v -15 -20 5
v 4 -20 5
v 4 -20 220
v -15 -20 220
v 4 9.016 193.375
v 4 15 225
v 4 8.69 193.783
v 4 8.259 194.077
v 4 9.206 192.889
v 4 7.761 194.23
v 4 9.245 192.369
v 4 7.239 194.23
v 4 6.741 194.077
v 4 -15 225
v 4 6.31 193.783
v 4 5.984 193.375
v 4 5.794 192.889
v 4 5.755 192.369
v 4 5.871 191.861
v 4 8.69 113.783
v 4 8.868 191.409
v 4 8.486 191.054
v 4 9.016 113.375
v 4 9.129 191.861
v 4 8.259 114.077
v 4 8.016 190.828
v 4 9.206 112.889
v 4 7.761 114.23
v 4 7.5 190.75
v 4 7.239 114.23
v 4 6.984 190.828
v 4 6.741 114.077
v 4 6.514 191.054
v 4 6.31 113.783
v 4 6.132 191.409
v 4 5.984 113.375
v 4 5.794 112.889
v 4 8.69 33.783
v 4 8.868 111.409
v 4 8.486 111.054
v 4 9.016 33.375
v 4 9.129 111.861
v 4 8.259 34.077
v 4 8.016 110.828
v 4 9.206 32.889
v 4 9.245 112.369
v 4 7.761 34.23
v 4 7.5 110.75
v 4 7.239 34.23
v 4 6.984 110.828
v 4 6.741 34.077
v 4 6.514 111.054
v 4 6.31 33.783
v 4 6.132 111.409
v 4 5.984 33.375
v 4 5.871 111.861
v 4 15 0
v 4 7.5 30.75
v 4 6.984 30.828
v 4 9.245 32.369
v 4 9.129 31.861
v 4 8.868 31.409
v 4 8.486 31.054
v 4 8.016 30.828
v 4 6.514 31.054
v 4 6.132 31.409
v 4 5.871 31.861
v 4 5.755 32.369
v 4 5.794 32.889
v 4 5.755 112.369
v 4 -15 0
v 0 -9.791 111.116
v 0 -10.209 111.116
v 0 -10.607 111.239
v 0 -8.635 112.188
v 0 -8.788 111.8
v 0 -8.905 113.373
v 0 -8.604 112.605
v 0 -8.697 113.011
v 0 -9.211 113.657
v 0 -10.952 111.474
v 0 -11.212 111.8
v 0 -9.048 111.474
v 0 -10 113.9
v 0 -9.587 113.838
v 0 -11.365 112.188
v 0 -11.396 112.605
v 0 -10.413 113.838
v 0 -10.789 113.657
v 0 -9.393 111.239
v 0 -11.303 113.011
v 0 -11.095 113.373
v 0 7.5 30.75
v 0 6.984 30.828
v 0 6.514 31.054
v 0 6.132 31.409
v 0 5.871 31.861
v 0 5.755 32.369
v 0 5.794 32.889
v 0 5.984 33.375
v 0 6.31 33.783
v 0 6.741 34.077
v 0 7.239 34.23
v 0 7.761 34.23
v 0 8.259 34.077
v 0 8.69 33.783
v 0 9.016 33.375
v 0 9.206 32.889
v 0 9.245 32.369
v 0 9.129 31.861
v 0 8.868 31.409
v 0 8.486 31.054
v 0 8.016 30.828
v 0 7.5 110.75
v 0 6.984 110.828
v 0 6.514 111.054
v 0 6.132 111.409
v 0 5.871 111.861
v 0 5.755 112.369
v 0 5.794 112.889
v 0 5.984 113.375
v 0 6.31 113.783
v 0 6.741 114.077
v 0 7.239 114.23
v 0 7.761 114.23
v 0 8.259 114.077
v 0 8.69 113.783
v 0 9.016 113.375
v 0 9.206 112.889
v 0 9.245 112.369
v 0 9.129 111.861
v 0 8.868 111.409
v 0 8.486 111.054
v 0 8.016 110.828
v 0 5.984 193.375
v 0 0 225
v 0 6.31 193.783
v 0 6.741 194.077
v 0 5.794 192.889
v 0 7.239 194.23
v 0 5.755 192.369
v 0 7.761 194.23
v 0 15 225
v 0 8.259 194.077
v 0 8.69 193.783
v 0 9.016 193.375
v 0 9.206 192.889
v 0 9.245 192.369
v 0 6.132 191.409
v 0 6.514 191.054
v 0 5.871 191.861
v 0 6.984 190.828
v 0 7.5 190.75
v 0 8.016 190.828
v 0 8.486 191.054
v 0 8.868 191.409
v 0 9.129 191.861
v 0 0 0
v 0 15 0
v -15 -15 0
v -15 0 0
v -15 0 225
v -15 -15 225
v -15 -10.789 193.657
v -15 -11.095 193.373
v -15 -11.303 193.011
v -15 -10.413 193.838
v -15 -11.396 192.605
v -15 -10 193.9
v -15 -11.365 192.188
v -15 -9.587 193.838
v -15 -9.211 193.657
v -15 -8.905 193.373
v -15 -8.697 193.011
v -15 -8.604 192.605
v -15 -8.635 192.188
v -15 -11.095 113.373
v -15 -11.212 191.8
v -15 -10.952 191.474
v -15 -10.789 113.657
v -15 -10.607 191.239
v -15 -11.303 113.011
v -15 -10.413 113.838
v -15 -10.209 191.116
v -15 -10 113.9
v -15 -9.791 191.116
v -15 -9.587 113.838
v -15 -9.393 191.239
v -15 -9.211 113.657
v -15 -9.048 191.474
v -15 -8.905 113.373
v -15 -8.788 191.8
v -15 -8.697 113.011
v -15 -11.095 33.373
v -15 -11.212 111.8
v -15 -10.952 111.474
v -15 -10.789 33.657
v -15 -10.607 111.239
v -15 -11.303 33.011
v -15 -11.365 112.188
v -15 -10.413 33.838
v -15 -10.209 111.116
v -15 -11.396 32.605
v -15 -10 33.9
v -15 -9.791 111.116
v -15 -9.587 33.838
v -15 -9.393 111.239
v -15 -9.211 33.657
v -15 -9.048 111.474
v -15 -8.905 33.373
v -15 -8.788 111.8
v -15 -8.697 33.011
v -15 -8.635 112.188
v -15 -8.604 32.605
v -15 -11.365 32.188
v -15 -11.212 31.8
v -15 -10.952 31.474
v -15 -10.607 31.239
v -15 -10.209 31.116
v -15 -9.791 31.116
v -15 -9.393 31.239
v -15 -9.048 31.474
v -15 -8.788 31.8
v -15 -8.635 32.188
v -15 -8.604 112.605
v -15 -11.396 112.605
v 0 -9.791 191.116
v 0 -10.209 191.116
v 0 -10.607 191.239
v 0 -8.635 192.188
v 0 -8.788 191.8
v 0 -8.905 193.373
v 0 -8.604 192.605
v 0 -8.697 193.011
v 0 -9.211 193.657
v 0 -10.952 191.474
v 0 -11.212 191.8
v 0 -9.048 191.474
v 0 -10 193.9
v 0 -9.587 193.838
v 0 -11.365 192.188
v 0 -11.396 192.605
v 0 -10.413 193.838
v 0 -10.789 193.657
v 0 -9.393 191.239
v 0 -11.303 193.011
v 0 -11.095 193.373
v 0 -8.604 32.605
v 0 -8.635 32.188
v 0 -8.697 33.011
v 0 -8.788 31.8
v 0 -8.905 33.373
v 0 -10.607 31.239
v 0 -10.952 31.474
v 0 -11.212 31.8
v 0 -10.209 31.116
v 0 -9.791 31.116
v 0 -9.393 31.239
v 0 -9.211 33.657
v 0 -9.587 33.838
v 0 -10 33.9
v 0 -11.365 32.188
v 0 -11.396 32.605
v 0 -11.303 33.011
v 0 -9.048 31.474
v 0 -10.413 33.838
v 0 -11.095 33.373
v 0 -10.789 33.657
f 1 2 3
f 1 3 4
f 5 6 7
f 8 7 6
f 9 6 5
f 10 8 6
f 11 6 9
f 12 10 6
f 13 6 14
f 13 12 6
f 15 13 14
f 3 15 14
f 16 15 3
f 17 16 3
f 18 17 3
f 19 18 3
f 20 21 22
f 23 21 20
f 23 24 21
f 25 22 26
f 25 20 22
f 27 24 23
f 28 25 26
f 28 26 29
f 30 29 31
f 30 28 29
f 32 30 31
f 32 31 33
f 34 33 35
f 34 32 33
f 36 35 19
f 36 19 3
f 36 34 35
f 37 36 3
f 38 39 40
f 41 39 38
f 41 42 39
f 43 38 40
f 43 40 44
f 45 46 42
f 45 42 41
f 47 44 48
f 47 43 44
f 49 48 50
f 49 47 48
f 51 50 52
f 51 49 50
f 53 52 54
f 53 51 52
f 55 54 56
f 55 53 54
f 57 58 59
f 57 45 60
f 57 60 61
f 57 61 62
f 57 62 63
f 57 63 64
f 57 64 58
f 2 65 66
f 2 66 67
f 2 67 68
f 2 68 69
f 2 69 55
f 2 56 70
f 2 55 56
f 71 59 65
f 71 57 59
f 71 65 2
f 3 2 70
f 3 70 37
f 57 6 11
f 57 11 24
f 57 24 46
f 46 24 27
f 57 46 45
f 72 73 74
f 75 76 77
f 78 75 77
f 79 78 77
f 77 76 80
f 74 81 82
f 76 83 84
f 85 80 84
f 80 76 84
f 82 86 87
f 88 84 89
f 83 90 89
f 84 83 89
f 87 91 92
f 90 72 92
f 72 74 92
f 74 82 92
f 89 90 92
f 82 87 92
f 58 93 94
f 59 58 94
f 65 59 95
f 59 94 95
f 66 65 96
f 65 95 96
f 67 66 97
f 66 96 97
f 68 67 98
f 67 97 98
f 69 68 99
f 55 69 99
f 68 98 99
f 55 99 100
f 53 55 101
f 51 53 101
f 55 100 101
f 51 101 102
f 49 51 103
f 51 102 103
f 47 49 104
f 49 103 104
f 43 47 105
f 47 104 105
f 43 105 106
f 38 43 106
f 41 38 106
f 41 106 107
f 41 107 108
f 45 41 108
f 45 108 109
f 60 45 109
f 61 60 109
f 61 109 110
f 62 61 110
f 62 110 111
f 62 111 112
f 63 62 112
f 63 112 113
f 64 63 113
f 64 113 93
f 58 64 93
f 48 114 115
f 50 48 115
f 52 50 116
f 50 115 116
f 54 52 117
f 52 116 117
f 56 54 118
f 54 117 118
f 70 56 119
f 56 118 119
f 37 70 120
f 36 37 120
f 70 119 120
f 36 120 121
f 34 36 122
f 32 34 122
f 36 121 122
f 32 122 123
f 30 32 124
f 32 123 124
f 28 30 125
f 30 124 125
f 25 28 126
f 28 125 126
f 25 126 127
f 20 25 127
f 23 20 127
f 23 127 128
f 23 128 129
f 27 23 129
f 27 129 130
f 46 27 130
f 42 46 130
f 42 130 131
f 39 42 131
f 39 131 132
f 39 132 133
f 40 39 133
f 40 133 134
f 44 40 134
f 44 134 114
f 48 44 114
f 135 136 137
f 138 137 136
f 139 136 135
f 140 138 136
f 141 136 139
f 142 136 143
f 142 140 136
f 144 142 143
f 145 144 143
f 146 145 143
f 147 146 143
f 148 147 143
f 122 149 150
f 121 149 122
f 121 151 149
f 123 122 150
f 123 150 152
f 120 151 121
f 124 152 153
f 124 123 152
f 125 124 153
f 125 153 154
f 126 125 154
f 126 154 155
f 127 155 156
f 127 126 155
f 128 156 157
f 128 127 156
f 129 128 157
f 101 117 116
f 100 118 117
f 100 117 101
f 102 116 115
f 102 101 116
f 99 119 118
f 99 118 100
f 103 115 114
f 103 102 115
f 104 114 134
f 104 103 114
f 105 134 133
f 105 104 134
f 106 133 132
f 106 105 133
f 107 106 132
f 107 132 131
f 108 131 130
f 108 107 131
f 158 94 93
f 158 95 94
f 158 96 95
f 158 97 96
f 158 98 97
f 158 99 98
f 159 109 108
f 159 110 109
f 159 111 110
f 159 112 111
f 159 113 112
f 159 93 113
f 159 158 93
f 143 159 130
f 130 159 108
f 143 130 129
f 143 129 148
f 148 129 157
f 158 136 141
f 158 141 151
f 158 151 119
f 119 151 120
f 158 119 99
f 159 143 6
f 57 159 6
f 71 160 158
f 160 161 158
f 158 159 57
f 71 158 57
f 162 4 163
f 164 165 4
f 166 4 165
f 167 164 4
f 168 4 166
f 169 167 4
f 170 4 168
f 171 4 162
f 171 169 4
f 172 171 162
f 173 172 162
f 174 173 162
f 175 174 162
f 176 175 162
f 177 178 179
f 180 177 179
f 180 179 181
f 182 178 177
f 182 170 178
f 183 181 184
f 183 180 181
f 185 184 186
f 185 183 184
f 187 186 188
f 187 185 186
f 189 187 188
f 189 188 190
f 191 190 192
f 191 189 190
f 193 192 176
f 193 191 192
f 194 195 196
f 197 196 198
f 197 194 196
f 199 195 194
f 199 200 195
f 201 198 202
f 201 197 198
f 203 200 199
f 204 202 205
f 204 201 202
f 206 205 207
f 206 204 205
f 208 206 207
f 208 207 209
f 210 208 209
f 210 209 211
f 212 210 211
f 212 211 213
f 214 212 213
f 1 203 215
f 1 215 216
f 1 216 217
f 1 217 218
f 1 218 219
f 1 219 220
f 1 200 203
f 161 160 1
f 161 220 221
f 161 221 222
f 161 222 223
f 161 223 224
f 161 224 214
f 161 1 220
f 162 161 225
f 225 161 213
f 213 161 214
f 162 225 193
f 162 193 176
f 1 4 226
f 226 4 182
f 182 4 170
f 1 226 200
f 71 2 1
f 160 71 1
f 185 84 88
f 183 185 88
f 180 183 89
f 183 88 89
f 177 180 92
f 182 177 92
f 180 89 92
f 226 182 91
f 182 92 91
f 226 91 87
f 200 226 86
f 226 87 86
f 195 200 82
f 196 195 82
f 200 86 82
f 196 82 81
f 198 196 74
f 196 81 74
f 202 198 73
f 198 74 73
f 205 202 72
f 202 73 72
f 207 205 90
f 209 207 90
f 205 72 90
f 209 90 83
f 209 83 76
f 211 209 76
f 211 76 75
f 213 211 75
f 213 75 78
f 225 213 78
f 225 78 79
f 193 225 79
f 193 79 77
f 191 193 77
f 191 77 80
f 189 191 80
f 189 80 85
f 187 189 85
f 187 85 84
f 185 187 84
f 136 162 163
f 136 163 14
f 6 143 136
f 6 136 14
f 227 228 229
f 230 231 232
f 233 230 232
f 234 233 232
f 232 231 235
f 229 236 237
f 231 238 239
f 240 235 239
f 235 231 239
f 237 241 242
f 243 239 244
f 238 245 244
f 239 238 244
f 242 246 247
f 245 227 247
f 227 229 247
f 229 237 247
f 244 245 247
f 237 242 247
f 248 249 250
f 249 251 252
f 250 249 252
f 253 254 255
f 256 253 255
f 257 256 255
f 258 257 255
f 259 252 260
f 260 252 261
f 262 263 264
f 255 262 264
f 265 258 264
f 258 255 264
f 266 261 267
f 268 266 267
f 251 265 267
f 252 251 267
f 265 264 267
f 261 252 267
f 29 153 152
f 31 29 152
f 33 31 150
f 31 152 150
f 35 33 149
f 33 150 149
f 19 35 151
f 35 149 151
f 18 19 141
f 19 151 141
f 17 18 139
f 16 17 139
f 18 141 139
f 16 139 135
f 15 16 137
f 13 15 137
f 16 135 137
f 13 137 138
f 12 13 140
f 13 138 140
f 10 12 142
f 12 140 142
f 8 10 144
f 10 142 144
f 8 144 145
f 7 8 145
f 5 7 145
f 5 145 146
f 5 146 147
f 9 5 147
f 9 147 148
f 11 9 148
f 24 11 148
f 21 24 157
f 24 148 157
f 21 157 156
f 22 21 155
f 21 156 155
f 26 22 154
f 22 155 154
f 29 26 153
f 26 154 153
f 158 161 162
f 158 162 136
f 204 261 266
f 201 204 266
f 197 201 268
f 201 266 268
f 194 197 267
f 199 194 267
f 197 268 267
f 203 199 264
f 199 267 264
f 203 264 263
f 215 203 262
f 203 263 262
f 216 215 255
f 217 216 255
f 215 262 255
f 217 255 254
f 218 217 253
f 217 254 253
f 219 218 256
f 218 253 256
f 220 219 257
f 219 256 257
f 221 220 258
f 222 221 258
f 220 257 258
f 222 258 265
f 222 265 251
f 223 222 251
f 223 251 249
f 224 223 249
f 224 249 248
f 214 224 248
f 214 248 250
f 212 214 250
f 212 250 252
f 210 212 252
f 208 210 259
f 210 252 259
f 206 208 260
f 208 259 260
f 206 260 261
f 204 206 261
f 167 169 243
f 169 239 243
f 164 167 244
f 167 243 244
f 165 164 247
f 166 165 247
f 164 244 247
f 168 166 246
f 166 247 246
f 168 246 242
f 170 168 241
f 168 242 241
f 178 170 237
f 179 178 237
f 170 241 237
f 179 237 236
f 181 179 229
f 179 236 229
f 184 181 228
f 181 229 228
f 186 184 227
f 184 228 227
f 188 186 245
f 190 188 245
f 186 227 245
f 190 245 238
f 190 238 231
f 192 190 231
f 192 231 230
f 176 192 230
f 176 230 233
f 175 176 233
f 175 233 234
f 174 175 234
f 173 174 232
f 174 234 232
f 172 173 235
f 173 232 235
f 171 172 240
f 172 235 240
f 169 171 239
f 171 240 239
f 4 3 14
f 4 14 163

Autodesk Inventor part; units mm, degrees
ref_plane "YZ Plane" through (0, 0, 0) normal (1, 0, 0) x (0, 1, 0)
ref_plane "XZ Plane" through (0, 0, 0) normal (0, 1, 0) x (-1, 0, 0)
ref_plane "XY Plane" through (0, 0, 0) normal (0, 0, 1) x (1, 0, 0)
sketch "Sketch1" plane through (0, 0, 0) normal (0, 0, 1) x (1, 0, 0)
  line L0 (0, 0) -> (0, 15)
  line L1 (0, 15) -> (4, 15)
  line L2 (4, 15) -> (4, -20)
  line L3 (4, -20) -> (-15, -20)
  line L4 (-15, -20) -> (-15, 0)
  line L5 (-15, 0) -> (0, 0)
  dimension "d0" = 15
  dimension "d1" = 4
  dimension "d2" = 35
extrude "Extrusion1" add sketch "Sketch1" along normal blind 225
sketch "Sketch2" plane through (4, -20, 0) normal (1, 0, 0) x (0, 0, -1)
  line L0 (0, 0) -> (0, 35) projected
  line L1 (0, 35) -> (-225, 35) projected
  line L2 (-225, 0) -> (-225, 35) projected
  line L3 (0, 0) -> (-225, 0) projected
  point P0 (0, 20)
  point P1 (-192.5, 27.5)
  point P2 (-112.5, 27.5)
  point P3 (-32.5, 27.5)
  point P4 (-112.5, 35)
  dimension "d5" = 80
  dimension "d6" = 80
  dimension "d7" = 7.5
hole "Hole1" at (4, 7.5, 192.5) at (4, 7.5, 112.5) at (4, 7.5, 32.5) direction (-1, 0, 0) diameter 3.5 end through all
chamfer "Chamfer1" distance 5 angle 45 2 edges at (-5.5, -20, 225) (-5.5, -20, 0)
sketch "Sketch3" plane through (-15, 0, 0) normal (-1, 0, 0) x (0, 0, 1)
  line L0 (5, -20) -> (220, -20) projected
  line L1 (225, -15) -> (220, -20) projected
  line L2 (225, 0) -> (225, -15) projected
  line L3 (5, -20) -> (0, -15) projected
  line L4 (0, 0) -> (0, -15) projected
  line L5 (0, 0) -> (225, 0) projected
  point P0 (32.5, -10)
  point P1 (112.5, -10)
  point P2 (192.5, -10)
  point P3 (112.5, -20)
  dimension "d18" = 80
  dimension "d19" = 80
  dimension "d20" = 10
hole "Hole2" at (-15, -10, 32.5) at (-15, -10, 112.5) at (-15, -10, 192.5) direction (1, 0, 0) diameter 2.8 depth 15
equation "\"d6\" = d5"
equation "\"d19\" = d18"
properties part number "Toolhead Dock Assembly" material "ABS Plastic"
